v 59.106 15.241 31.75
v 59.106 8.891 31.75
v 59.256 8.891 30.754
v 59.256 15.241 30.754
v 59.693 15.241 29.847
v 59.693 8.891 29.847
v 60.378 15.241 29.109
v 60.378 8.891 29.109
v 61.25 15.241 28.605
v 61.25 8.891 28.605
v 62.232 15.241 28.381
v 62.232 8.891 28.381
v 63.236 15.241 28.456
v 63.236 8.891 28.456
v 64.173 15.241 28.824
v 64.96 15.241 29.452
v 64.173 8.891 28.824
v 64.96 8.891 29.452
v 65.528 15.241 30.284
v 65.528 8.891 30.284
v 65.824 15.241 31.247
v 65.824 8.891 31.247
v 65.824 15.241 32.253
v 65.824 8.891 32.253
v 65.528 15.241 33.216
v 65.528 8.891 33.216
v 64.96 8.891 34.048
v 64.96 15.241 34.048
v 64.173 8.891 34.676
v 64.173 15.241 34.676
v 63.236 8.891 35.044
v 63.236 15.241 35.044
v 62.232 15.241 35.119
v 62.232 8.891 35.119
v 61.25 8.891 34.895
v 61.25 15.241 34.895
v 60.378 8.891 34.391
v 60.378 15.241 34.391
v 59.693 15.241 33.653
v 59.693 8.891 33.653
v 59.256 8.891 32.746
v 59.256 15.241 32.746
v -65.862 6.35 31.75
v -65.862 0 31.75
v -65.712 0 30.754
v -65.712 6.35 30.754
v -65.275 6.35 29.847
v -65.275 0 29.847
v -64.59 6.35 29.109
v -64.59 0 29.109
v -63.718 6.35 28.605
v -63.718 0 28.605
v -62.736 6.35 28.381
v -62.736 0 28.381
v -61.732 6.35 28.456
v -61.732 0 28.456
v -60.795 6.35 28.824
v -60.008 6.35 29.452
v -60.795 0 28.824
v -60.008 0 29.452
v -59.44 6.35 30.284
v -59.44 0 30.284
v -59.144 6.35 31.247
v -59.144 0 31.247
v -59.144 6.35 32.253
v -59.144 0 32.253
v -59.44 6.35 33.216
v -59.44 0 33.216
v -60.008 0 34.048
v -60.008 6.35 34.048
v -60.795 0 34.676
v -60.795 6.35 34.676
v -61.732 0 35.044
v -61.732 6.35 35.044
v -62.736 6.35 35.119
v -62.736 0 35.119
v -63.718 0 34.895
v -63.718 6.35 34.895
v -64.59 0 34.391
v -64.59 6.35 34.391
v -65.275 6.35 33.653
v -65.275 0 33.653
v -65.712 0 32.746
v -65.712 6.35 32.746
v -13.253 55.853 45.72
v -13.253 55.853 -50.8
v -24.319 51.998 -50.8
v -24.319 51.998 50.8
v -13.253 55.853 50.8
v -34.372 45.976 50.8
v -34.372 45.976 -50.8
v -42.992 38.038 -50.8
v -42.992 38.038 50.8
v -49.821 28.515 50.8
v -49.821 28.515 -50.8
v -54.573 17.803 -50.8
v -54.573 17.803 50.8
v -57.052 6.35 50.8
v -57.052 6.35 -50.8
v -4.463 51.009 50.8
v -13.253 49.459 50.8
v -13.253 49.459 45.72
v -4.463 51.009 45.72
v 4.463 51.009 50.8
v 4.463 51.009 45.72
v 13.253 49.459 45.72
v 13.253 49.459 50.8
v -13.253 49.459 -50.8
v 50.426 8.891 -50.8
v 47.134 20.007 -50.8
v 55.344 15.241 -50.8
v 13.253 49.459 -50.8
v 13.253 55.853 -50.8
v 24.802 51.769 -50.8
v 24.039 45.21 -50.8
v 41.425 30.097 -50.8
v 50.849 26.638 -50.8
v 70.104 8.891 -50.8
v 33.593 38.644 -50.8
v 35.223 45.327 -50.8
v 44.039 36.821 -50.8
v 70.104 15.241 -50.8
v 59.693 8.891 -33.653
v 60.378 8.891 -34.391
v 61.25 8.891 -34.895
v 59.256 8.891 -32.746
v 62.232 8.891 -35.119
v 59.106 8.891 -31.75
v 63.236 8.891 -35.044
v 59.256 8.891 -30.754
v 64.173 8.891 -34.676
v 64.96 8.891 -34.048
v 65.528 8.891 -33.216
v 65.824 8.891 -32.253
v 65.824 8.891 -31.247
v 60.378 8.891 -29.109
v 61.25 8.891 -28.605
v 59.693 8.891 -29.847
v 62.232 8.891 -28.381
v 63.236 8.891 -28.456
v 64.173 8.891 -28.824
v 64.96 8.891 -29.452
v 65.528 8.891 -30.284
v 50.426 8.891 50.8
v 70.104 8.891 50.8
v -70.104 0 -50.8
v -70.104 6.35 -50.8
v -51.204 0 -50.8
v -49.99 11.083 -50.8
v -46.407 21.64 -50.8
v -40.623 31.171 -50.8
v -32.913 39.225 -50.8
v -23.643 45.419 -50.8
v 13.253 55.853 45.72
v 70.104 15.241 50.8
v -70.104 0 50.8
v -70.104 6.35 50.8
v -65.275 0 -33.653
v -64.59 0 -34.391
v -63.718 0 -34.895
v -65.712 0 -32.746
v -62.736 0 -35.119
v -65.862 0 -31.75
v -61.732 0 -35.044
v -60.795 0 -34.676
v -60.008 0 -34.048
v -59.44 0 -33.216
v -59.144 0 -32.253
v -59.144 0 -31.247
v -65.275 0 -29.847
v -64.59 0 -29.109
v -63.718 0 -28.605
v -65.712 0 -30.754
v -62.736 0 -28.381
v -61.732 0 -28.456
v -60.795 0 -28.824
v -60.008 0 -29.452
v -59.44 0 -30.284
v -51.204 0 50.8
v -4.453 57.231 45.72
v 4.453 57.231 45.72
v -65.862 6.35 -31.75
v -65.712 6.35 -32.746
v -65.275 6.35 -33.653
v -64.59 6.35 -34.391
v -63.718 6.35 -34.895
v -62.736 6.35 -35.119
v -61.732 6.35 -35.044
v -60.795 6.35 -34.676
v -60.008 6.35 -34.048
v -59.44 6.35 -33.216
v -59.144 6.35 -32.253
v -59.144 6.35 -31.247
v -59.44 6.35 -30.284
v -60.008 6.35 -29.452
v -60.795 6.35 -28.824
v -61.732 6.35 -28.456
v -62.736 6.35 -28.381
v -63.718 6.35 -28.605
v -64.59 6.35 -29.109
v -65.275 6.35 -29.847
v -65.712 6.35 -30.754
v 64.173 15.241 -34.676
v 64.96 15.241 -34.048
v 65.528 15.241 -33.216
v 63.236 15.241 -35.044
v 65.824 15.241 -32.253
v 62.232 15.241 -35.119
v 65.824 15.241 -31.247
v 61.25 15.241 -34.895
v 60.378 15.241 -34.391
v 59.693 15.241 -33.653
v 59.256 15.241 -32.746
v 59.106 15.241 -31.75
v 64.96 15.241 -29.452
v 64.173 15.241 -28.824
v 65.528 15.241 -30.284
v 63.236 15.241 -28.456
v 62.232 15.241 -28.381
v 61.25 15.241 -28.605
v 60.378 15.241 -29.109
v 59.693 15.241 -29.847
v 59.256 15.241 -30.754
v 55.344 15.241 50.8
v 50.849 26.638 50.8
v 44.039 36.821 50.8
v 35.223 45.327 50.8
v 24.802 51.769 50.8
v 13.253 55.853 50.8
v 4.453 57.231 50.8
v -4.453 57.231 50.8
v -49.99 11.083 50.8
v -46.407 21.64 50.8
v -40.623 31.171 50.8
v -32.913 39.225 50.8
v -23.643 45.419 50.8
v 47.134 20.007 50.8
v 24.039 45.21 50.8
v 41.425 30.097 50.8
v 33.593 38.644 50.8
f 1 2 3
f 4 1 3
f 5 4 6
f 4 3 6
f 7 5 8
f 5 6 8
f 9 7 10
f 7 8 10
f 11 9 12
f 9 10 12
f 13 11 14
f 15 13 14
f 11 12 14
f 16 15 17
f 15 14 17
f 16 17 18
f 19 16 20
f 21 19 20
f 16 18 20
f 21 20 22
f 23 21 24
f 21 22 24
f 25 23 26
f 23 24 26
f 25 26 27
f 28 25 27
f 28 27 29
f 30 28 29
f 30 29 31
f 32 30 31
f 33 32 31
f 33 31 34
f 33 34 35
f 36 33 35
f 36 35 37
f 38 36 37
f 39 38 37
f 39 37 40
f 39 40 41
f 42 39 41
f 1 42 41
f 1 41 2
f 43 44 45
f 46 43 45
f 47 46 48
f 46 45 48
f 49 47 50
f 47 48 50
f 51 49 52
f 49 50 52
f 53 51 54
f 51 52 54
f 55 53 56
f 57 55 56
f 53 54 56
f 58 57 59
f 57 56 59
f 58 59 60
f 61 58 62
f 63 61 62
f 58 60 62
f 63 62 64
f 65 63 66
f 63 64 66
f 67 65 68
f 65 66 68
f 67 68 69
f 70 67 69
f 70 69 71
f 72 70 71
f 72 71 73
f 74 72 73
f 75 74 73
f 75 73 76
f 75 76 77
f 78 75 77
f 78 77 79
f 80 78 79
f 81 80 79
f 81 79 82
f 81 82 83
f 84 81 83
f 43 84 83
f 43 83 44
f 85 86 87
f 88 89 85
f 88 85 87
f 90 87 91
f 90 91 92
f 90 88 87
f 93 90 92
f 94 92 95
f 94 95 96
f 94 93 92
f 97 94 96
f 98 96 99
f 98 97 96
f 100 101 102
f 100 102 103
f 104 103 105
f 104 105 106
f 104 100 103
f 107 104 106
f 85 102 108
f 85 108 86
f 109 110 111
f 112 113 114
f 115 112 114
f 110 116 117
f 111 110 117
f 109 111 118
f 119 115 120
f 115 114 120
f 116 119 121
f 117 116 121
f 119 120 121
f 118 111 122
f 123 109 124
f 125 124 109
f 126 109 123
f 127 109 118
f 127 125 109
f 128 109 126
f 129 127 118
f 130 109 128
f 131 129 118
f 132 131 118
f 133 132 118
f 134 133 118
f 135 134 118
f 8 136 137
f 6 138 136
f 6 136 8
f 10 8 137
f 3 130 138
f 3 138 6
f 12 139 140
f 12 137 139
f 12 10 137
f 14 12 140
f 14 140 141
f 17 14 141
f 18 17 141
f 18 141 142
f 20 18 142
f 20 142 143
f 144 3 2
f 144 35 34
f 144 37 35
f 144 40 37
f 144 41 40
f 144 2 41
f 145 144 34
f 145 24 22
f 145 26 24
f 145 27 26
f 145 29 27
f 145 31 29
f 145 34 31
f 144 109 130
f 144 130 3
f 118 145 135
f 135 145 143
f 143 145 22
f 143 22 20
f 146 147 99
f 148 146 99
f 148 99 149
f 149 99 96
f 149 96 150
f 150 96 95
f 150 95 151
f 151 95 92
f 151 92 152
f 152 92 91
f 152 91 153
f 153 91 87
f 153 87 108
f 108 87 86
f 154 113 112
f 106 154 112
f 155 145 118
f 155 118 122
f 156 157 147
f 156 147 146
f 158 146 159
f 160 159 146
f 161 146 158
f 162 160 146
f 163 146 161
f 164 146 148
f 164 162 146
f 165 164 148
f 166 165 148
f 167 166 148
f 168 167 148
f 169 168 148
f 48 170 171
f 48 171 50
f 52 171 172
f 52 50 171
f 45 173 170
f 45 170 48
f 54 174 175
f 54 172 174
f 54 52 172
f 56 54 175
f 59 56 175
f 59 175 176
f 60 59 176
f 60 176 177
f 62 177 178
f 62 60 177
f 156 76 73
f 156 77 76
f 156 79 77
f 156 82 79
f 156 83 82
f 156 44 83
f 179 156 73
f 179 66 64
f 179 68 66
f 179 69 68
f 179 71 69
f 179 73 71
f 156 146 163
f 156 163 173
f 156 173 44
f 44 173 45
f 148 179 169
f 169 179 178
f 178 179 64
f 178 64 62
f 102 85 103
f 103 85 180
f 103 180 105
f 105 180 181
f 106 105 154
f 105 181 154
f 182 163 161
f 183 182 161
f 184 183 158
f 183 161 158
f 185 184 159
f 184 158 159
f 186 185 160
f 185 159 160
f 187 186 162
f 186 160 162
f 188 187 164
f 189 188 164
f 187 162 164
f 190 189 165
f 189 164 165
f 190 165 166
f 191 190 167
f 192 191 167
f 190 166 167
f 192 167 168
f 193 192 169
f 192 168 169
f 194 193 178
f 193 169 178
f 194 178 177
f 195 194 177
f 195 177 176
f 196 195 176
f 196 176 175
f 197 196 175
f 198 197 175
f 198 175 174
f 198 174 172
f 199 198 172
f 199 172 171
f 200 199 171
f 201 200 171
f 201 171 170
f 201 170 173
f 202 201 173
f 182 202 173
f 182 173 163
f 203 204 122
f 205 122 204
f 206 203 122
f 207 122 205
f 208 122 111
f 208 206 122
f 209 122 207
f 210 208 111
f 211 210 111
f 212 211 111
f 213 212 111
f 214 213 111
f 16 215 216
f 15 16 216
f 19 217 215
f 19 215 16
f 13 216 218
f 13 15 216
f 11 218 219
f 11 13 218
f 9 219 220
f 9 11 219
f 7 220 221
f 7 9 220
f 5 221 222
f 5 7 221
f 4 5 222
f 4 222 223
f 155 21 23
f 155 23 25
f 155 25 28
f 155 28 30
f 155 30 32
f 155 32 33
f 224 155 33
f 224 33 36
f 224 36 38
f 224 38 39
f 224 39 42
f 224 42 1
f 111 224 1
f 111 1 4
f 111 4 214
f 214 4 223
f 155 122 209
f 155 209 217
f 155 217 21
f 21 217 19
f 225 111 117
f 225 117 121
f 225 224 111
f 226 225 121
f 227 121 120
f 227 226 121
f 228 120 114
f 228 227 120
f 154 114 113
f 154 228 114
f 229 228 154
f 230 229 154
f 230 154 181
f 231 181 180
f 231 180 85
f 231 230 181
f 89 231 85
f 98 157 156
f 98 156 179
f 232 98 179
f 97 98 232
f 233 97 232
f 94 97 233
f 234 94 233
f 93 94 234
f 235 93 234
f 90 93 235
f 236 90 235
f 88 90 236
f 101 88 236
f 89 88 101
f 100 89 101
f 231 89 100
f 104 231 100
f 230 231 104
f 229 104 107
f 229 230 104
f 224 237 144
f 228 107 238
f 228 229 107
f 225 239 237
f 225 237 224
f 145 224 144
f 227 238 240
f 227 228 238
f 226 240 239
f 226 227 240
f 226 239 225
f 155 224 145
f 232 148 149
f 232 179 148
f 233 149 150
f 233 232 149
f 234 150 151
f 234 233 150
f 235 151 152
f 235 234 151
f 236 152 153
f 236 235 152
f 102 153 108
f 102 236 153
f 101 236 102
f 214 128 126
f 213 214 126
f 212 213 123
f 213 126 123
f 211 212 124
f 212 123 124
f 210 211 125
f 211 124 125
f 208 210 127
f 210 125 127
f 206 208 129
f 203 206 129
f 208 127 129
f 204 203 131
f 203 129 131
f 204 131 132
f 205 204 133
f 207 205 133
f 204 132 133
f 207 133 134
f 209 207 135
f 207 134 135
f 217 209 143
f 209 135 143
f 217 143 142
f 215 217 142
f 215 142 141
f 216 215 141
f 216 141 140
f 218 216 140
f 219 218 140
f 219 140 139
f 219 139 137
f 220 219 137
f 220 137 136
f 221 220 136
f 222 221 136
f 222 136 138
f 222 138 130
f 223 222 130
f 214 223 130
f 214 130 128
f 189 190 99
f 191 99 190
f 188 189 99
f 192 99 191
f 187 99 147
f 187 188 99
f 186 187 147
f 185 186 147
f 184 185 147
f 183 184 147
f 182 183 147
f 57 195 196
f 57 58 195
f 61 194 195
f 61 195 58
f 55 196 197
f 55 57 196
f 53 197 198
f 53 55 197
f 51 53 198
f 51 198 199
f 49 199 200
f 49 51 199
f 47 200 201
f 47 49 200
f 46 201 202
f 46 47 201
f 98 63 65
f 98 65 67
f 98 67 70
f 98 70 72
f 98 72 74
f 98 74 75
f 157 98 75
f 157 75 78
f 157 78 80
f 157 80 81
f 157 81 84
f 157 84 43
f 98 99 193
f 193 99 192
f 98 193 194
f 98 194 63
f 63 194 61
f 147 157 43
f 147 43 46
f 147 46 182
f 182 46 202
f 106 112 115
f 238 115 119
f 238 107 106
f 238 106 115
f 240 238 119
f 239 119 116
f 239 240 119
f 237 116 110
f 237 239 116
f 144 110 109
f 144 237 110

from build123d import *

# Parameters (mm, degrees)
BOSS_EXTRUDE1_DEPTH     = 50.8
BOSS_EXTRUDE1_2_DEPTH   = 50.8
BOSS_EXTRUDE2_START     = 50.8
BOSS_EXTRUDE2_DEPTH     = 5.08
F_1_4_CLEARANCE_HOLE1_D = 6.7564
F_1_4_CLEARANCE_HOLE2_D = 6.7564


with BuildPart() as part:
    # Sketch1 → Boss-Extrude1 (new body, symmetric)
    with BuildSketch(Plane.XY):
        with BuildLine():
            ThreePointArc((-13.252570374, 55.853277384), (-42.992049277, 38.038177072), (-57.051702131, 6.35))
            Line((-57.051702131, 6.35), (-70.104, 6.35))
            Line((-70.104, 6.35), (-70.104, 0))
            Line((-70.104, 0), (-51.203999954, 0))
            ThreePointArc((-51.203999954, 0), (-40.6228644, 31.171020183), (-13.252570374, 49.459265965))
            Line((-13.252570374, 49.459265965), (-13.252570374, 55.853277384))
        make_face()
    extrude(amount=BOSS_EXTRUDE1_DEPTH, both=True)



with BuildPart() as body_2:
    # Sketch1 → Boss-Extrude1 2 (new body, symmetric)
    with BuildSketch(Plane.XY):
        with BuildLine():
            Line((13.252570374, 55.853277384), (13.252570374, 49.459265965))
            ThreePointArc((13.252570374, 49.459265965), (37.75154872, 34.59292096), (50.42609614, 8.891481281))
            Line((50.42609614, 8.891481281), (70.104, 8.891481281))
            Line((70.104, 8.891481281), (70.104, 15.241481281))
            Line((70.104, 15.241481281), (55.343621713, 15.241481281))
            ThreePointArc((55.343621713, 15.241481281), (39.858360326, 41.310172211), (13.252570374, 55.853277384))
        make_face()
    extrude(amount=BOSS_EXTRUDE1_2_DEPTH, both=True)


with BuildPart() as part_1:
    add(part.part)

    add(body_2.part)  # Boss-Extrude2 merges body 2
    # Sketch1<4> → Boss-Extrude2 (add)
    with BuildSketch(Plane.XY.offset(BOSS_EXTRUDE2_START)):
        with BuildLine():
            Line((-13.252570374, 55.853277384), (-13.252570374, 49.459265965))
            ThreePointArc((-13.252570374, 49.459265965), (0, 51.203999954), (13.252570374, 49.459265965))
            Line((13.252570374, 49.459265965), (13.252570374, 55.853277384))
            ThreePointArc((13.252570374, 55.853277384), (0, 57.404), (-13.252570374, 55.853277384))
        make_face()
    extrude(amount=-BOSS_EXTRUDE2_DEPTH)

    # 1/4 Clearance Hole1 (through all)
    with Locations(Plane(origin=(0, 6.35, 0), x_dir=(1, 0, 0), z_dir=(0, 1, 0))):
        with Locations((-62.484, -31.75), (-62.484, 31.75)):
            Hole(F_1_4_CLEARANCE_HOLE1_D / 2)

    # 1/4 Clearance Hole2 (through all)
    with Locations(Plane(origin=(0, 15.241481281, 0), x_dir=(1, 0, 0), z_dir=(0, 1, 0))):
        with Locations((62.484, -31.75), (62.484, 31.75)):
            Hole(F_1_4_CLEARANCE_HOLE2_D / 2)


solid = part_1.part
